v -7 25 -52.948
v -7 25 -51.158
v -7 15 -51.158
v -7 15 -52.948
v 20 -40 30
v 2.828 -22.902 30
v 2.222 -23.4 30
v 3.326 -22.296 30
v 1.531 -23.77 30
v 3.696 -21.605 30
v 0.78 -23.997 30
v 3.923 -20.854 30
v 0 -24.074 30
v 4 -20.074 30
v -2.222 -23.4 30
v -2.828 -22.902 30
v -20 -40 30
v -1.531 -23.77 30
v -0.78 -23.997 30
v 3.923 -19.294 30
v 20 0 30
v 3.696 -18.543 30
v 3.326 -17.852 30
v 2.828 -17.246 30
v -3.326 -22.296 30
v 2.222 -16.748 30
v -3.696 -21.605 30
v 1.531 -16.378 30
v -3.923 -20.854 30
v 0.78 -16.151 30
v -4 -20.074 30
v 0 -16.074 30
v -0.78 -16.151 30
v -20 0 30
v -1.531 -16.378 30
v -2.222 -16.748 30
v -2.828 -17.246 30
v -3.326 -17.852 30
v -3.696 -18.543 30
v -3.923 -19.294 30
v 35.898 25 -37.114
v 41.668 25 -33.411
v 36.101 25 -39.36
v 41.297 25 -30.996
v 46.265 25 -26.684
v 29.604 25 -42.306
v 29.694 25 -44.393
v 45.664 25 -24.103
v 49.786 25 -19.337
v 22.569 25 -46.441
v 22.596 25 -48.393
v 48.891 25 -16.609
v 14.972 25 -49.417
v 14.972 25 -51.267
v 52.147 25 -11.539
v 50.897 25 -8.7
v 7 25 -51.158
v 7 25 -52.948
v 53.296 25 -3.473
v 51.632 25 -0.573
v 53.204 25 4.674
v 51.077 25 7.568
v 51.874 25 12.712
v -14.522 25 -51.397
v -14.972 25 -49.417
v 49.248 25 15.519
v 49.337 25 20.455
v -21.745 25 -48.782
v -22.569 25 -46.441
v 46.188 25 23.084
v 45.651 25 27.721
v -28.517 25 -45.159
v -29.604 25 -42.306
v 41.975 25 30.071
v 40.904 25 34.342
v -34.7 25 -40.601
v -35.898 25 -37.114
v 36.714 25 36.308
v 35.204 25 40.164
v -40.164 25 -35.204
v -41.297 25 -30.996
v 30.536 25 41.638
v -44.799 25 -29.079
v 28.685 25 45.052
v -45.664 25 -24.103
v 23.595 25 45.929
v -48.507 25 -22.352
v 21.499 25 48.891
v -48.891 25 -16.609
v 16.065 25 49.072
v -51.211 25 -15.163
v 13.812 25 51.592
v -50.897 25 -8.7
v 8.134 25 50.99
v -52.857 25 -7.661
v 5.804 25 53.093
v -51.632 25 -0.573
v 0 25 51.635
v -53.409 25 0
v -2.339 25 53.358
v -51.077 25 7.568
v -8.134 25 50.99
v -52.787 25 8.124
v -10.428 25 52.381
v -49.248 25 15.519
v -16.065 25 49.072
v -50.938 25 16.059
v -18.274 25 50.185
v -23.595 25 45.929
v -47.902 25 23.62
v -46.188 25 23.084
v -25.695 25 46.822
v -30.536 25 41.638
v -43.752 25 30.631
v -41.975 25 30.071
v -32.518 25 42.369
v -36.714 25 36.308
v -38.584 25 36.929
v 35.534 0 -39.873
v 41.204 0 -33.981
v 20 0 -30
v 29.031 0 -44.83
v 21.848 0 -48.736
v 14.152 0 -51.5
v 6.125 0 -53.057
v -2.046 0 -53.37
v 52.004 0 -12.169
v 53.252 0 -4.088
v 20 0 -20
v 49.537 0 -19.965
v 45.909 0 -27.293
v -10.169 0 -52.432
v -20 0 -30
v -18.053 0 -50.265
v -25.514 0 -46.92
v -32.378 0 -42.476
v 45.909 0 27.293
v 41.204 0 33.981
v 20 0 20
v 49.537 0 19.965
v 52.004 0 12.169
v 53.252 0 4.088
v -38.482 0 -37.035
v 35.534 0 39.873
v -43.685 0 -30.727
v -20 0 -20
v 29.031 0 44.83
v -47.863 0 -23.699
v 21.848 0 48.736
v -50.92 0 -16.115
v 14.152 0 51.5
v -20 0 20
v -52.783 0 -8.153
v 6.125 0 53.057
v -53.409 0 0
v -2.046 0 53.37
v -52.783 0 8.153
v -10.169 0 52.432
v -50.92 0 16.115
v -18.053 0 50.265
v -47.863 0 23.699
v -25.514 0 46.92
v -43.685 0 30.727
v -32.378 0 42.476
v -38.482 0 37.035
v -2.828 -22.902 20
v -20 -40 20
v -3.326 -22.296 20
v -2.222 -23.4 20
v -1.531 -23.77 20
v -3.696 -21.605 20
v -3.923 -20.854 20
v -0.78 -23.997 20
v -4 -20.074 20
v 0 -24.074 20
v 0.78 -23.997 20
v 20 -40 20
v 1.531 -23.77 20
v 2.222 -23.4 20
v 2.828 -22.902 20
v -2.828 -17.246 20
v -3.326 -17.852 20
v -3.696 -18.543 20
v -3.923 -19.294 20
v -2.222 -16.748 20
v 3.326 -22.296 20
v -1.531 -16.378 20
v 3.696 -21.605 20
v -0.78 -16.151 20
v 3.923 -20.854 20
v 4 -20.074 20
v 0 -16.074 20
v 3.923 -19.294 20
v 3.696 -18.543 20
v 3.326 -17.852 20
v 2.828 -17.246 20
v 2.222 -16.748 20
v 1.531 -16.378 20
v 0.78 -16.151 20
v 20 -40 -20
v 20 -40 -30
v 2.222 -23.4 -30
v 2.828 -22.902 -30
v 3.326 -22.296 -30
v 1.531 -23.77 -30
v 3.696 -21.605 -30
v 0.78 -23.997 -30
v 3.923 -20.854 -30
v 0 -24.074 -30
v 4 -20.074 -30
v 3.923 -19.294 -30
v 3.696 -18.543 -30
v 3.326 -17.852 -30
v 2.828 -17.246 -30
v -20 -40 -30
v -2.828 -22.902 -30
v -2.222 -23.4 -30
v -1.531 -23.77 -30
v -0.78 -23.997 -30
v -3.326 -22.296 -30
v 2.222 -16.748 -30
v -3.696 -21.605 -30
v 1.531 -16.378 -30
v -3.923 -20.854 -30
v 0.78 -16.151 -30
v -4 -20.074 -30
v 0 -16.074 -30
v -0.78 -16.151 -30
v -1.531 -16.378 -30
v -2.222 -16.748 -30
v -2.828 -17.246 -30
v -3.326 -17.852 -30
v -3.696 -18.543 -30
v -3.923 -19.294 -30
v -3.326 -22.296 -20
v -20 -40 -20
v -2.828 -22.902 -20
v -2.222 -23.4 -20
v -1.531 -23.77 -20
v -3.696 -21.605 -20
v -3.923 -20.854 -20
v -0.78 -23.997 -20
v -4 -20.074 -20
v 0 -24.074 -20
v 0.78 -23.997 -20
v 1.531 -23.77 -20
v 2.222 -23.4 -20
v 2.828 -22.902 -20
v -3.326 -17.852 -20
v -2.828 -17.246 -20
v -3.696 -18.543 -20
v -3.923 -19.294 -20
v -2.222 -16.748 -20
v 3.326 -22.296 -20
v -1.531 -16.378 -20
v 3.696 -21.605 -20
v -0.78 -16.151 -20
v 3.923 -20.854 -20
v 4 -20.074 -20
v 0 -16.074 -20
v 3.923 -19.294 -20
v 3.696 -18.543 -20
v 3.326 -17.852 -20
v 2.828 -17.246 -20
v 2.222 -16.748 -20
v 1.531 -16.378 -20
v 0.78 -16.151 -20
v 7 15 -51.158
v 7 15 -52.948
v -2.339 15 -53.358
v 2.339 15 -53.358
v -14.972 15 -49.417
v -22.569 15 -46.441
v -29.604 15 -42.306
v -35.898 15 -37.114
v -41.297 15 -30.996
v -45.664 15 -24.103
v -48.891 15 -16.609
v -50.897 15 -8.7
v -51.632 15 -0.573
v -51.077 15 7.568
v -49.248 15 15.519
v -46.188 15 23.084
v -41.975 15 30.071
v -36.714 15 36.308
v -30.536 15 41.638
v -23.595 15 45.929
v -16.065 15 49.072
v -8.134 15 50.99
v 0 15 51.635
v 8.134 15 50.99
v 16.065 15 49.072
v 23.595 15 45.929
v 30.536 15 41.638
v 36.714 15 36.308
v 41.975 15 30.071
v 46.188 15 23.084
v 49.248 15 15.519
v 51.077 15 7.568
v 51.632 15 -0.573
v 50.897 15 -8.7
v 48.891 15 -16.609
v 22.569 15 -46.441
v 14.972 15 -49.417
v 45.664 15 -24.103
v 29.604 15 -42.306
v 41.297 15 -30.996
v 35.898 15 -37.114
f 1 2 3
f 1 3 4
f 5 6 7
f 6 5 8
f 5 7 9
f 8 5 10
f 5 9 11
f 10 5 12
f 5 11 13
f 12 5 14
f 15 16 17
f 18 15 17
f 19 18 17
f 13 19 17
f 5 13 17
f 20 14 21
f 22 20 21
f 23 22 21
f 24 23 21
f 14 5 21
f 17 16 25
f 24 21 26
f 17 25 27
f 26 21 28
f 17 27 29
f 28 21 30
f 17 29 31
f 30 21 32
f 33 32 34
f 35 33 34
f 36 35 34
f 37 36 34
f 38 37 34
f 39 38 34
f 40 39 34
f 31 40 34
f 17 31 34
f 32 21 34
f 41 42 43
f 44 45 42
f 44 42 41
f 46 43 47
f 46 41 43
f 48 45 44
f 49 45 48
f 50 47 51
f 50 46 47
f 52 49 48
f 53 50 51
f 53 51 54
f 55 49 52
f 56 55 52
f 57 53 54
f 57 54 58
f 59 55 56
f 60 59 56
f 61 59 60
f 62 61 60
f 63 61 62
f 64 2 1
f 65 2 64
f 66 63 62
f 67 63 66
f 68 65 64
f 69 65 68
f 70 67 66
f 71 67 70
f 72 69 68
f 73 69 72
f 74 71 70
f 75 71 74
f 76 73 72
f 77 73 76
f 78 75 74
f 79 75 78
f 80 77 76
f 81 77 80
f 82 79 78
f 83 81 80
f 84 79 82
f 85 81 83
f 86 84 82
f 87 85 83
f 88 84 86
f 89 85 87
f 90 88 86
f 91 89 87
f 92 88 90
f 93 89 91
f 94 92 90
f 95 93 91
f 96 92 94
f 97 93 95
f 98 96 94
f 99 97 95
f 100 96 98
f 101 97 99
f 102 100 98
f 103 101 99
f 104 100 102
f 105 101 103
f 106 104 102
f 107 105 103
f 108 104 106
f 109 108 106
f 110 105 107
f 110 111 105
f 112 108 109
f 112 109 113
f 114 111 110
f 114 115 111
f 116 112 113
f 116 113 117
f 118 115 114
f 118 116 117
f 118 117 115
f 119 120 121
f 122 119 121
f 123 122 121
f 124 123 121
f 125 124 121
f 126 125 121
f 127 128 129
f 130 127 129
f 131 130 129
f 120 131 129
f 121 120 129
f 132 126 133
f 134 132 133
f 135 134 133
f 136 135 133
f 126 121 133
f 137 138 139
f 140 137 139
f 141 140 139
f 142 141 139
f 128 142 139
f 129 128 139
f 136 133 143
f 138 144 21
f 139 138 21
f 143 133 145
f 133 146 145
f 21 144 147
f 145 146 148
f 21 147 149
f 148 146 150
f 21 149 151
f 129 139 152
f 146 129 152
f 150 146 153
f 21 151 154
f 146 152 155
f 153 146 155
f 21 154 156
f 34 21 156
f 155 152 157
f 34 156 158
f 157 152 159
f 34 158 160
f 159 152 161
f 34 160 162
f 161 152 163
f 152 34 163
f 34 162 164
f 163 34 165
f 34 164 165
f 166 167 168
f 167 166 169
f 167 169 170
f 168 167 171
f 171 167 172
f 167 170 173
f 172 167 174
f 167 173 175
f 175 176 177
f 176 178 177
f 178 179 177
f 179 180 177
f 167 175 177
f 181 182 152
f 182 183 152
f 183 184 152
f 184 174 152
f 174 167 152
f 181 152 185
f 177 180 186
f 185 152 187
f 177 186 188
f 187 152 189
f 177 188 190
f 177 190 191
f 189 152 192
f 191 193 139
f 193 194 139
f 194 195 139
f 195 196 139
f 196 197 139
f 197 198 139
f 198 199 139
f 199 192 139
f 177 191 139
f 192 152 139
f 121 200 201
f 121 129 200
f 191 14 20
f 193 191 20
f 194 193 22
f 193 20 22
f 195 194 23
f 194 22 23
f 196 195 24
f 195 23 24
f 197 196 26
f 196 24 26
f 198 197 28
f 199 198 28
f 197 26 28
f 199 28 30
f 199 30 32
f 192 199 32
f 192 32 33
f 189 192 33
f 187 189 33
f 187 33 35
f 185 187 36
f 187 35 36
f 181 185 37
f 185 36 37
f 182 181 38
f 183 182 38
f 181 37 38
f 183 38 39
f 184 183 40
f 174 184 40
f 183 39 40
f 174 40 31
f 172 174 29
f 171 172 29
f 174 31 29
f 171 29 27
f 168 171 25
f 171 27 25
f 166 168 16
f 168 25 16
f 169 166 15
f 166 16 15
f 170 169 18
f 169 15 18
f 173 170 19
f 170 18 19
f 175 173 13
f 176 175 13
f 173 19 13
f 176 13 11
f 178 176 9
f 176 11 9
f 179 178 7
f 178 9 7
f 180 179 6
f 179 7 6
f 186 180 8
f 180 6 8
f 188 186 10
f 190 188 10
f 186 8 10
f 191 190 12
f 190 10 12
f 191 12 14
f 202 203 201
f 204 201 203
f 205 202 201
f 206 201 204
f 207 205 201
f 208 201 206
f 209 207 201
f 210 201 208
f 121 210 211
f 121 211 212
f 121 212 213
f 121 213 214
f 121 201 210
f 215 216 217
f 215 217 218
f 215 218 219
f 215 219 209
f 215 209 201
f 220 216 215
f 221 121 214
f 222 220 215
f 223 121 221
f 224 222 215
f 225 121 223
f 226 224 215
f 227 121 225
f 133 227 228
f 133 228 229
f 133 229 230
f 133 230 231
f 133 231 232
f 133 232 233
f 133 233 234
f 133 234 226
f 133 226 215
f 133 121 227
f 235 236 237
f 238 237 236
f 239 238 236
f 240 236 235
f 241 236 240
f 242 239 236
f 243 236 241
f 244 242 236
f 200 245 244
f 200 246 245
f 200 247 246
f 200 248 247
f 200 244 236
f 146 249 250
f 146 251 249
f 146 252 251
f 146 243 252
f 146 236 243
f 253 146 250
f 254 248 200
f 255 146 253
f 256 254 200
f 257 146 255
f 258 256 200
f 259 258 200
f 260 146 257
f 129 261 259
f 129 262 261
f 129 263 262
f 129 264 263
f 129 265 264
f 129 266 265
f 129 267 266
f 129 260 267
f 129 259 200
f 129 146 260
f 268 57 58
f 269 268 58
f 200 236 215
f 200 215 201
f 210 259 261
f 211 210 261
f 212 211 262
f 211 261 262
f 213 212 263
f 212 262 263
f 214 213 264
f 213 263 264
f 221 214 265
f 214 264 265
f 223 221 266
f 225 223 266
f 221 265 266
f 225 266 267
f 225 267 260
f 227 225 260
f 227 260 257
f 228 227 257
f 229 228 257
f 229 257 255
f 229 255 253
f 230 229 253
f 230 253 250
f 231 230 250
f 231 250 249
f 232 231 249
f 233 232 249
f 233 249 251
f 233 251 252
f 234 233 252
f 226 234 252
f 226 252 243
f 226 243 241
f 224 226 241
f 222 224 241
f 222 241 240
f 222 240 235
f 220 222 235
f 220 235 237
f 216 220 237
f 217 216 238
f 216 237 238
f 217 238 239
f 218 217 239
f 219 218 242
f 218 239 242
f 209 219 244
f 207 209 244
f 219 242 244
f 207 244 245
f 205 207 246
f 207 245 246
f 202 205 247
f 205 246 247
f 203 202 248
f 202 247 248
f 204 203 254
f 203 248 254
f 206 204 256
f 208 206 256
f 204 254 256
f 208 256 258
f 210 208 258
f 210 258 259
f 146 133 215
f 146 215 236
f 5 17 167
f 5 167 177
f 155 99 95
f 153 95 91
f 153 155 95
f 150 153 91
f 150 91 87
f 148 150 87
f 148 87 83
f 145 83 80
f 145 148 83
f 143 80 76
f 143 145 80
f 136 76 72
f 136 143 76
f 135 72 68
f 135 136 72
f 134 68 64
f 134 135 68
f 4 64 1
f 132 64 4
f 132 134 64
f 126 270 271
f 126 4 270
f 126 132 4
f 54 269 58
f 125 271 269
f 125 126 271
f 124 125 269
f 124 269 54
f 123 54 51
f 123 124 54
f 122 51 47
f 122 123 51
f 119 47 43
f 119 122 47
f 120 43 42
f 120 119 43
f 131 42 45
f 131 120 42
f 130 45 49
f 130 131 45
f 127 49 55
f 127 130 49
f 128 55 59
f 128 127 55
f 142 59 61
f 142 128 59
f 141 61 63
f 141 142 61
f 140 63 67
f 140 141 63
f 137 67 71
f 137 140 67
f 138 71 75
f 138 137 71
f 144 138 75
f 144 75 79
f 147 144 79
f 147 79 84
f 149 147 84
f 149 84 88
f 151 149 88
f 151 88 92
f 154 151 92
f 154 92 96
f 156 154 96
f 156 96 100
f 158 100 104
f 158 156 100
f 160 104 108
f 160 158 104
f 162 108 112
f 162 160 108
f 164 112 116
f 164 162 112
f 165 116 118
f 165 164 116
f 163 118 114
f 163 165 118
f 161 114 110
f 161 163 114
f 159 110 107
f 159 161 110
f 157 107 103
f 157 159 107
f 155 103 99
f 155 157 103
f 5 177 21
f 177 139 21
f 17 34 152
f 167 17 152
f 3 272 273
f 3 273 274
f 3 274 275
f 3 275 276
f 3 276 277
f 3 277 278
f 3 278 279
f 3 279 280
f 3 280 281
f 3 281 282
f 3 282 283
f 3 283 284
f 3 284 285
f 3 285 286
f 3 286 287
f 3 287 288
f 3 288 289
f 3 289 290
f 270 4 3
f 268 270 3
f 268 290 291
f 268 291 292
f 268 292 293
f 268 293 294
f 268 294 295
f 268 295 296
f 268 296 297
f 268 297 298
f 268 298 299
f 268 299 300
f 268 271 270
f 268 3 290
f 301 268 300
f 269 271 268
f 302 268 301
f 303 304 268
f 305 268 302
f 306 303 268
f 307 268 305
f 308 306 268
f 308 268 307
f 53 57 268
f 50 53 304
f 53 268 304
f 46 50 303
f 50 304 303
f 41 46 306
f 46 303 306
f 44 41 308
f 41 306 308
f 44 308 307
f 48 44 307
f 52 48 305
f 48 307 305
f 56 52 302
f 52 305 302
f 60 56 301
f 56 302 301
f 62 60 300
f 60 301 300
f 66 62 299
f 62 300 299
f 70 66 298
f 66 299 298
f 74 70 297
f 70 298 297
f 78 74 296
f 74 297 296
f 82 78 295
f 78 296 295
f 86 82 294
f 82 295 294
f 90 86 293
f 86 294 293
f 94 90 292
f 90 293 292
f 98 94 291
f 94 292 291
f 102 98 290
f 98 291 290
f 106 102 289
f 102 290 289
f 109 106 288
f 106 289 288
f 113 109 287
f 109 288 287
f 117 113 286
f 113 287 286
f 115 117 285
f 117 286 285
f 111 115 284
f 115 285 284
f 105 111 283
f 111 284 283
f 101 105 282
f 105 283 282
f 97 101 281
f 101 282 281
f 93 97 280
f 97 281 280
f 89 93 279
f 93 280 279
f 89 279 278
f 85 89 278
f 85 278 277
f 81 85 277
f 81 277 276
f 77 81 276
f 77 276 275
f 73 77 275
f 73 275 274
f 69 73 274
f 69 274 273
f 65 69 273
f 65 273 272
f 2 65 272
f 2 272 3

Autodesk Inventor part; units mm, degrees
ref_plane "YZ Plane" through (0, 0, 0) normal (1, 0, 0) x (0, 1, 0)
ref_plane "XZ Plane" through (0, 0, 0) normal (0, 1, 0) x (-1, 0, 0)
ref_plane "XY Plane" through (0, 0, 0) normal (0, 0, 1) x (1, 0, 0)
sketch "스케치1" plane through (0, 0, 0) normal (0, 1, 0) x (-1, 0, 0)
  circle A0 centre (0, 0) radius 51.635
  circle A1 centre (0, 0) radius 53.4089
  dimension "d0" = 103.27
extrude "돌출1" add sketch "스케치1" along normal blind 25
extrude "돌출2" add sketch "스케치1" along normal blind 15 contours A0
sketch "스케치2" plane through (0, 25, 0) normal (0, 1, 0) x (1, 0, 0)
  line L0 (-7, 38.0484) -> (-7, 59.2742)
  line L1 (7, 38.0484) -> (7, 59.2742)
  circle A0 centre (0, 0) radius 53.4089 projected
  circle A1 centre (0, 0) radius 51.635 projected
  point P0 (-7, 51.1583)
  point P1 (7, 51.1583)
  point P2 (7, 52.9482)
  point P3 (-7, 52.9482)
  dimension "d5" = 14
  dimension "d6" = 7
extrude "돌출3" cut sketch "스케치2" against normal blind 10 contours L0 A0 L1 A1 picked at (5.4466, 51.8962)
sketch "스케치5" plane through (0, 0, 0) normal (0, -1, 0) x (1, 0, 0)
  circle A0 centre (0, 0) radius 53.4089 projected
  line L0 (0, 53.4089) -> (0, -53.4089) construction
  line L1 (-53.4089, 0) -> (53.4089, 0) construction
  line L2 (-49.5229, 20) -> (49.5229, 20) construction
  line L3 (49.5229, 20) -> (49.5229, -20) construction
  line L4 (49.5229, -20) -> (-49.5229, -20) construction
  line L5 (-49.5229, -20) -> (-49.5229, 20) construction
  line L6 (-20, 20) -> (20, 20)
  line L7 (20, 20) -> (20, 30)
  line L8 (20, 30) -> (-20, 30)
  line L9 (-20, 30) -> (-20, 20)
  line L10 (20, -20) -> (20, -30)
  line L11 (20, -30) -> (-20, -30)
  line L12 (-20, -30) -> (-20, -20)
  line L13 (-20, -20) -> (20, -20)
  point P0 (0, 30)
  dimension "d19" = 40
  dimension "d20" = 20
  dimension "d21" = 40
  dimension "d22" = 10
extrude "돌출6" add sketch "스케치5" along normal blind 40 contours L9 L8 L7 L6 | L10 L11 L12 L13
sketch "스케치6" plane through (-20, 0, 30) normal (0, 0, 1) x (1, 0, 0)
  line L0 (0, 0) -> (40, 0) projected
  line L1 (0, 0) -> (0, -40) projected
  line L2 (40, -40) -> (0, -40) projected
  line L3 (40, 0) -> (40, -40) projected
  circle A0 centre (20, -20.074) radius 4
  point P0 (20, 0)
  dimension "d25" = 8
  dimension "d26" = 20.074
  dimension "d27" = 20
extrude "돌출7" cut sketch "스케치6" against normal blind 69.75 contours A0
properties part number "lidar_case"
